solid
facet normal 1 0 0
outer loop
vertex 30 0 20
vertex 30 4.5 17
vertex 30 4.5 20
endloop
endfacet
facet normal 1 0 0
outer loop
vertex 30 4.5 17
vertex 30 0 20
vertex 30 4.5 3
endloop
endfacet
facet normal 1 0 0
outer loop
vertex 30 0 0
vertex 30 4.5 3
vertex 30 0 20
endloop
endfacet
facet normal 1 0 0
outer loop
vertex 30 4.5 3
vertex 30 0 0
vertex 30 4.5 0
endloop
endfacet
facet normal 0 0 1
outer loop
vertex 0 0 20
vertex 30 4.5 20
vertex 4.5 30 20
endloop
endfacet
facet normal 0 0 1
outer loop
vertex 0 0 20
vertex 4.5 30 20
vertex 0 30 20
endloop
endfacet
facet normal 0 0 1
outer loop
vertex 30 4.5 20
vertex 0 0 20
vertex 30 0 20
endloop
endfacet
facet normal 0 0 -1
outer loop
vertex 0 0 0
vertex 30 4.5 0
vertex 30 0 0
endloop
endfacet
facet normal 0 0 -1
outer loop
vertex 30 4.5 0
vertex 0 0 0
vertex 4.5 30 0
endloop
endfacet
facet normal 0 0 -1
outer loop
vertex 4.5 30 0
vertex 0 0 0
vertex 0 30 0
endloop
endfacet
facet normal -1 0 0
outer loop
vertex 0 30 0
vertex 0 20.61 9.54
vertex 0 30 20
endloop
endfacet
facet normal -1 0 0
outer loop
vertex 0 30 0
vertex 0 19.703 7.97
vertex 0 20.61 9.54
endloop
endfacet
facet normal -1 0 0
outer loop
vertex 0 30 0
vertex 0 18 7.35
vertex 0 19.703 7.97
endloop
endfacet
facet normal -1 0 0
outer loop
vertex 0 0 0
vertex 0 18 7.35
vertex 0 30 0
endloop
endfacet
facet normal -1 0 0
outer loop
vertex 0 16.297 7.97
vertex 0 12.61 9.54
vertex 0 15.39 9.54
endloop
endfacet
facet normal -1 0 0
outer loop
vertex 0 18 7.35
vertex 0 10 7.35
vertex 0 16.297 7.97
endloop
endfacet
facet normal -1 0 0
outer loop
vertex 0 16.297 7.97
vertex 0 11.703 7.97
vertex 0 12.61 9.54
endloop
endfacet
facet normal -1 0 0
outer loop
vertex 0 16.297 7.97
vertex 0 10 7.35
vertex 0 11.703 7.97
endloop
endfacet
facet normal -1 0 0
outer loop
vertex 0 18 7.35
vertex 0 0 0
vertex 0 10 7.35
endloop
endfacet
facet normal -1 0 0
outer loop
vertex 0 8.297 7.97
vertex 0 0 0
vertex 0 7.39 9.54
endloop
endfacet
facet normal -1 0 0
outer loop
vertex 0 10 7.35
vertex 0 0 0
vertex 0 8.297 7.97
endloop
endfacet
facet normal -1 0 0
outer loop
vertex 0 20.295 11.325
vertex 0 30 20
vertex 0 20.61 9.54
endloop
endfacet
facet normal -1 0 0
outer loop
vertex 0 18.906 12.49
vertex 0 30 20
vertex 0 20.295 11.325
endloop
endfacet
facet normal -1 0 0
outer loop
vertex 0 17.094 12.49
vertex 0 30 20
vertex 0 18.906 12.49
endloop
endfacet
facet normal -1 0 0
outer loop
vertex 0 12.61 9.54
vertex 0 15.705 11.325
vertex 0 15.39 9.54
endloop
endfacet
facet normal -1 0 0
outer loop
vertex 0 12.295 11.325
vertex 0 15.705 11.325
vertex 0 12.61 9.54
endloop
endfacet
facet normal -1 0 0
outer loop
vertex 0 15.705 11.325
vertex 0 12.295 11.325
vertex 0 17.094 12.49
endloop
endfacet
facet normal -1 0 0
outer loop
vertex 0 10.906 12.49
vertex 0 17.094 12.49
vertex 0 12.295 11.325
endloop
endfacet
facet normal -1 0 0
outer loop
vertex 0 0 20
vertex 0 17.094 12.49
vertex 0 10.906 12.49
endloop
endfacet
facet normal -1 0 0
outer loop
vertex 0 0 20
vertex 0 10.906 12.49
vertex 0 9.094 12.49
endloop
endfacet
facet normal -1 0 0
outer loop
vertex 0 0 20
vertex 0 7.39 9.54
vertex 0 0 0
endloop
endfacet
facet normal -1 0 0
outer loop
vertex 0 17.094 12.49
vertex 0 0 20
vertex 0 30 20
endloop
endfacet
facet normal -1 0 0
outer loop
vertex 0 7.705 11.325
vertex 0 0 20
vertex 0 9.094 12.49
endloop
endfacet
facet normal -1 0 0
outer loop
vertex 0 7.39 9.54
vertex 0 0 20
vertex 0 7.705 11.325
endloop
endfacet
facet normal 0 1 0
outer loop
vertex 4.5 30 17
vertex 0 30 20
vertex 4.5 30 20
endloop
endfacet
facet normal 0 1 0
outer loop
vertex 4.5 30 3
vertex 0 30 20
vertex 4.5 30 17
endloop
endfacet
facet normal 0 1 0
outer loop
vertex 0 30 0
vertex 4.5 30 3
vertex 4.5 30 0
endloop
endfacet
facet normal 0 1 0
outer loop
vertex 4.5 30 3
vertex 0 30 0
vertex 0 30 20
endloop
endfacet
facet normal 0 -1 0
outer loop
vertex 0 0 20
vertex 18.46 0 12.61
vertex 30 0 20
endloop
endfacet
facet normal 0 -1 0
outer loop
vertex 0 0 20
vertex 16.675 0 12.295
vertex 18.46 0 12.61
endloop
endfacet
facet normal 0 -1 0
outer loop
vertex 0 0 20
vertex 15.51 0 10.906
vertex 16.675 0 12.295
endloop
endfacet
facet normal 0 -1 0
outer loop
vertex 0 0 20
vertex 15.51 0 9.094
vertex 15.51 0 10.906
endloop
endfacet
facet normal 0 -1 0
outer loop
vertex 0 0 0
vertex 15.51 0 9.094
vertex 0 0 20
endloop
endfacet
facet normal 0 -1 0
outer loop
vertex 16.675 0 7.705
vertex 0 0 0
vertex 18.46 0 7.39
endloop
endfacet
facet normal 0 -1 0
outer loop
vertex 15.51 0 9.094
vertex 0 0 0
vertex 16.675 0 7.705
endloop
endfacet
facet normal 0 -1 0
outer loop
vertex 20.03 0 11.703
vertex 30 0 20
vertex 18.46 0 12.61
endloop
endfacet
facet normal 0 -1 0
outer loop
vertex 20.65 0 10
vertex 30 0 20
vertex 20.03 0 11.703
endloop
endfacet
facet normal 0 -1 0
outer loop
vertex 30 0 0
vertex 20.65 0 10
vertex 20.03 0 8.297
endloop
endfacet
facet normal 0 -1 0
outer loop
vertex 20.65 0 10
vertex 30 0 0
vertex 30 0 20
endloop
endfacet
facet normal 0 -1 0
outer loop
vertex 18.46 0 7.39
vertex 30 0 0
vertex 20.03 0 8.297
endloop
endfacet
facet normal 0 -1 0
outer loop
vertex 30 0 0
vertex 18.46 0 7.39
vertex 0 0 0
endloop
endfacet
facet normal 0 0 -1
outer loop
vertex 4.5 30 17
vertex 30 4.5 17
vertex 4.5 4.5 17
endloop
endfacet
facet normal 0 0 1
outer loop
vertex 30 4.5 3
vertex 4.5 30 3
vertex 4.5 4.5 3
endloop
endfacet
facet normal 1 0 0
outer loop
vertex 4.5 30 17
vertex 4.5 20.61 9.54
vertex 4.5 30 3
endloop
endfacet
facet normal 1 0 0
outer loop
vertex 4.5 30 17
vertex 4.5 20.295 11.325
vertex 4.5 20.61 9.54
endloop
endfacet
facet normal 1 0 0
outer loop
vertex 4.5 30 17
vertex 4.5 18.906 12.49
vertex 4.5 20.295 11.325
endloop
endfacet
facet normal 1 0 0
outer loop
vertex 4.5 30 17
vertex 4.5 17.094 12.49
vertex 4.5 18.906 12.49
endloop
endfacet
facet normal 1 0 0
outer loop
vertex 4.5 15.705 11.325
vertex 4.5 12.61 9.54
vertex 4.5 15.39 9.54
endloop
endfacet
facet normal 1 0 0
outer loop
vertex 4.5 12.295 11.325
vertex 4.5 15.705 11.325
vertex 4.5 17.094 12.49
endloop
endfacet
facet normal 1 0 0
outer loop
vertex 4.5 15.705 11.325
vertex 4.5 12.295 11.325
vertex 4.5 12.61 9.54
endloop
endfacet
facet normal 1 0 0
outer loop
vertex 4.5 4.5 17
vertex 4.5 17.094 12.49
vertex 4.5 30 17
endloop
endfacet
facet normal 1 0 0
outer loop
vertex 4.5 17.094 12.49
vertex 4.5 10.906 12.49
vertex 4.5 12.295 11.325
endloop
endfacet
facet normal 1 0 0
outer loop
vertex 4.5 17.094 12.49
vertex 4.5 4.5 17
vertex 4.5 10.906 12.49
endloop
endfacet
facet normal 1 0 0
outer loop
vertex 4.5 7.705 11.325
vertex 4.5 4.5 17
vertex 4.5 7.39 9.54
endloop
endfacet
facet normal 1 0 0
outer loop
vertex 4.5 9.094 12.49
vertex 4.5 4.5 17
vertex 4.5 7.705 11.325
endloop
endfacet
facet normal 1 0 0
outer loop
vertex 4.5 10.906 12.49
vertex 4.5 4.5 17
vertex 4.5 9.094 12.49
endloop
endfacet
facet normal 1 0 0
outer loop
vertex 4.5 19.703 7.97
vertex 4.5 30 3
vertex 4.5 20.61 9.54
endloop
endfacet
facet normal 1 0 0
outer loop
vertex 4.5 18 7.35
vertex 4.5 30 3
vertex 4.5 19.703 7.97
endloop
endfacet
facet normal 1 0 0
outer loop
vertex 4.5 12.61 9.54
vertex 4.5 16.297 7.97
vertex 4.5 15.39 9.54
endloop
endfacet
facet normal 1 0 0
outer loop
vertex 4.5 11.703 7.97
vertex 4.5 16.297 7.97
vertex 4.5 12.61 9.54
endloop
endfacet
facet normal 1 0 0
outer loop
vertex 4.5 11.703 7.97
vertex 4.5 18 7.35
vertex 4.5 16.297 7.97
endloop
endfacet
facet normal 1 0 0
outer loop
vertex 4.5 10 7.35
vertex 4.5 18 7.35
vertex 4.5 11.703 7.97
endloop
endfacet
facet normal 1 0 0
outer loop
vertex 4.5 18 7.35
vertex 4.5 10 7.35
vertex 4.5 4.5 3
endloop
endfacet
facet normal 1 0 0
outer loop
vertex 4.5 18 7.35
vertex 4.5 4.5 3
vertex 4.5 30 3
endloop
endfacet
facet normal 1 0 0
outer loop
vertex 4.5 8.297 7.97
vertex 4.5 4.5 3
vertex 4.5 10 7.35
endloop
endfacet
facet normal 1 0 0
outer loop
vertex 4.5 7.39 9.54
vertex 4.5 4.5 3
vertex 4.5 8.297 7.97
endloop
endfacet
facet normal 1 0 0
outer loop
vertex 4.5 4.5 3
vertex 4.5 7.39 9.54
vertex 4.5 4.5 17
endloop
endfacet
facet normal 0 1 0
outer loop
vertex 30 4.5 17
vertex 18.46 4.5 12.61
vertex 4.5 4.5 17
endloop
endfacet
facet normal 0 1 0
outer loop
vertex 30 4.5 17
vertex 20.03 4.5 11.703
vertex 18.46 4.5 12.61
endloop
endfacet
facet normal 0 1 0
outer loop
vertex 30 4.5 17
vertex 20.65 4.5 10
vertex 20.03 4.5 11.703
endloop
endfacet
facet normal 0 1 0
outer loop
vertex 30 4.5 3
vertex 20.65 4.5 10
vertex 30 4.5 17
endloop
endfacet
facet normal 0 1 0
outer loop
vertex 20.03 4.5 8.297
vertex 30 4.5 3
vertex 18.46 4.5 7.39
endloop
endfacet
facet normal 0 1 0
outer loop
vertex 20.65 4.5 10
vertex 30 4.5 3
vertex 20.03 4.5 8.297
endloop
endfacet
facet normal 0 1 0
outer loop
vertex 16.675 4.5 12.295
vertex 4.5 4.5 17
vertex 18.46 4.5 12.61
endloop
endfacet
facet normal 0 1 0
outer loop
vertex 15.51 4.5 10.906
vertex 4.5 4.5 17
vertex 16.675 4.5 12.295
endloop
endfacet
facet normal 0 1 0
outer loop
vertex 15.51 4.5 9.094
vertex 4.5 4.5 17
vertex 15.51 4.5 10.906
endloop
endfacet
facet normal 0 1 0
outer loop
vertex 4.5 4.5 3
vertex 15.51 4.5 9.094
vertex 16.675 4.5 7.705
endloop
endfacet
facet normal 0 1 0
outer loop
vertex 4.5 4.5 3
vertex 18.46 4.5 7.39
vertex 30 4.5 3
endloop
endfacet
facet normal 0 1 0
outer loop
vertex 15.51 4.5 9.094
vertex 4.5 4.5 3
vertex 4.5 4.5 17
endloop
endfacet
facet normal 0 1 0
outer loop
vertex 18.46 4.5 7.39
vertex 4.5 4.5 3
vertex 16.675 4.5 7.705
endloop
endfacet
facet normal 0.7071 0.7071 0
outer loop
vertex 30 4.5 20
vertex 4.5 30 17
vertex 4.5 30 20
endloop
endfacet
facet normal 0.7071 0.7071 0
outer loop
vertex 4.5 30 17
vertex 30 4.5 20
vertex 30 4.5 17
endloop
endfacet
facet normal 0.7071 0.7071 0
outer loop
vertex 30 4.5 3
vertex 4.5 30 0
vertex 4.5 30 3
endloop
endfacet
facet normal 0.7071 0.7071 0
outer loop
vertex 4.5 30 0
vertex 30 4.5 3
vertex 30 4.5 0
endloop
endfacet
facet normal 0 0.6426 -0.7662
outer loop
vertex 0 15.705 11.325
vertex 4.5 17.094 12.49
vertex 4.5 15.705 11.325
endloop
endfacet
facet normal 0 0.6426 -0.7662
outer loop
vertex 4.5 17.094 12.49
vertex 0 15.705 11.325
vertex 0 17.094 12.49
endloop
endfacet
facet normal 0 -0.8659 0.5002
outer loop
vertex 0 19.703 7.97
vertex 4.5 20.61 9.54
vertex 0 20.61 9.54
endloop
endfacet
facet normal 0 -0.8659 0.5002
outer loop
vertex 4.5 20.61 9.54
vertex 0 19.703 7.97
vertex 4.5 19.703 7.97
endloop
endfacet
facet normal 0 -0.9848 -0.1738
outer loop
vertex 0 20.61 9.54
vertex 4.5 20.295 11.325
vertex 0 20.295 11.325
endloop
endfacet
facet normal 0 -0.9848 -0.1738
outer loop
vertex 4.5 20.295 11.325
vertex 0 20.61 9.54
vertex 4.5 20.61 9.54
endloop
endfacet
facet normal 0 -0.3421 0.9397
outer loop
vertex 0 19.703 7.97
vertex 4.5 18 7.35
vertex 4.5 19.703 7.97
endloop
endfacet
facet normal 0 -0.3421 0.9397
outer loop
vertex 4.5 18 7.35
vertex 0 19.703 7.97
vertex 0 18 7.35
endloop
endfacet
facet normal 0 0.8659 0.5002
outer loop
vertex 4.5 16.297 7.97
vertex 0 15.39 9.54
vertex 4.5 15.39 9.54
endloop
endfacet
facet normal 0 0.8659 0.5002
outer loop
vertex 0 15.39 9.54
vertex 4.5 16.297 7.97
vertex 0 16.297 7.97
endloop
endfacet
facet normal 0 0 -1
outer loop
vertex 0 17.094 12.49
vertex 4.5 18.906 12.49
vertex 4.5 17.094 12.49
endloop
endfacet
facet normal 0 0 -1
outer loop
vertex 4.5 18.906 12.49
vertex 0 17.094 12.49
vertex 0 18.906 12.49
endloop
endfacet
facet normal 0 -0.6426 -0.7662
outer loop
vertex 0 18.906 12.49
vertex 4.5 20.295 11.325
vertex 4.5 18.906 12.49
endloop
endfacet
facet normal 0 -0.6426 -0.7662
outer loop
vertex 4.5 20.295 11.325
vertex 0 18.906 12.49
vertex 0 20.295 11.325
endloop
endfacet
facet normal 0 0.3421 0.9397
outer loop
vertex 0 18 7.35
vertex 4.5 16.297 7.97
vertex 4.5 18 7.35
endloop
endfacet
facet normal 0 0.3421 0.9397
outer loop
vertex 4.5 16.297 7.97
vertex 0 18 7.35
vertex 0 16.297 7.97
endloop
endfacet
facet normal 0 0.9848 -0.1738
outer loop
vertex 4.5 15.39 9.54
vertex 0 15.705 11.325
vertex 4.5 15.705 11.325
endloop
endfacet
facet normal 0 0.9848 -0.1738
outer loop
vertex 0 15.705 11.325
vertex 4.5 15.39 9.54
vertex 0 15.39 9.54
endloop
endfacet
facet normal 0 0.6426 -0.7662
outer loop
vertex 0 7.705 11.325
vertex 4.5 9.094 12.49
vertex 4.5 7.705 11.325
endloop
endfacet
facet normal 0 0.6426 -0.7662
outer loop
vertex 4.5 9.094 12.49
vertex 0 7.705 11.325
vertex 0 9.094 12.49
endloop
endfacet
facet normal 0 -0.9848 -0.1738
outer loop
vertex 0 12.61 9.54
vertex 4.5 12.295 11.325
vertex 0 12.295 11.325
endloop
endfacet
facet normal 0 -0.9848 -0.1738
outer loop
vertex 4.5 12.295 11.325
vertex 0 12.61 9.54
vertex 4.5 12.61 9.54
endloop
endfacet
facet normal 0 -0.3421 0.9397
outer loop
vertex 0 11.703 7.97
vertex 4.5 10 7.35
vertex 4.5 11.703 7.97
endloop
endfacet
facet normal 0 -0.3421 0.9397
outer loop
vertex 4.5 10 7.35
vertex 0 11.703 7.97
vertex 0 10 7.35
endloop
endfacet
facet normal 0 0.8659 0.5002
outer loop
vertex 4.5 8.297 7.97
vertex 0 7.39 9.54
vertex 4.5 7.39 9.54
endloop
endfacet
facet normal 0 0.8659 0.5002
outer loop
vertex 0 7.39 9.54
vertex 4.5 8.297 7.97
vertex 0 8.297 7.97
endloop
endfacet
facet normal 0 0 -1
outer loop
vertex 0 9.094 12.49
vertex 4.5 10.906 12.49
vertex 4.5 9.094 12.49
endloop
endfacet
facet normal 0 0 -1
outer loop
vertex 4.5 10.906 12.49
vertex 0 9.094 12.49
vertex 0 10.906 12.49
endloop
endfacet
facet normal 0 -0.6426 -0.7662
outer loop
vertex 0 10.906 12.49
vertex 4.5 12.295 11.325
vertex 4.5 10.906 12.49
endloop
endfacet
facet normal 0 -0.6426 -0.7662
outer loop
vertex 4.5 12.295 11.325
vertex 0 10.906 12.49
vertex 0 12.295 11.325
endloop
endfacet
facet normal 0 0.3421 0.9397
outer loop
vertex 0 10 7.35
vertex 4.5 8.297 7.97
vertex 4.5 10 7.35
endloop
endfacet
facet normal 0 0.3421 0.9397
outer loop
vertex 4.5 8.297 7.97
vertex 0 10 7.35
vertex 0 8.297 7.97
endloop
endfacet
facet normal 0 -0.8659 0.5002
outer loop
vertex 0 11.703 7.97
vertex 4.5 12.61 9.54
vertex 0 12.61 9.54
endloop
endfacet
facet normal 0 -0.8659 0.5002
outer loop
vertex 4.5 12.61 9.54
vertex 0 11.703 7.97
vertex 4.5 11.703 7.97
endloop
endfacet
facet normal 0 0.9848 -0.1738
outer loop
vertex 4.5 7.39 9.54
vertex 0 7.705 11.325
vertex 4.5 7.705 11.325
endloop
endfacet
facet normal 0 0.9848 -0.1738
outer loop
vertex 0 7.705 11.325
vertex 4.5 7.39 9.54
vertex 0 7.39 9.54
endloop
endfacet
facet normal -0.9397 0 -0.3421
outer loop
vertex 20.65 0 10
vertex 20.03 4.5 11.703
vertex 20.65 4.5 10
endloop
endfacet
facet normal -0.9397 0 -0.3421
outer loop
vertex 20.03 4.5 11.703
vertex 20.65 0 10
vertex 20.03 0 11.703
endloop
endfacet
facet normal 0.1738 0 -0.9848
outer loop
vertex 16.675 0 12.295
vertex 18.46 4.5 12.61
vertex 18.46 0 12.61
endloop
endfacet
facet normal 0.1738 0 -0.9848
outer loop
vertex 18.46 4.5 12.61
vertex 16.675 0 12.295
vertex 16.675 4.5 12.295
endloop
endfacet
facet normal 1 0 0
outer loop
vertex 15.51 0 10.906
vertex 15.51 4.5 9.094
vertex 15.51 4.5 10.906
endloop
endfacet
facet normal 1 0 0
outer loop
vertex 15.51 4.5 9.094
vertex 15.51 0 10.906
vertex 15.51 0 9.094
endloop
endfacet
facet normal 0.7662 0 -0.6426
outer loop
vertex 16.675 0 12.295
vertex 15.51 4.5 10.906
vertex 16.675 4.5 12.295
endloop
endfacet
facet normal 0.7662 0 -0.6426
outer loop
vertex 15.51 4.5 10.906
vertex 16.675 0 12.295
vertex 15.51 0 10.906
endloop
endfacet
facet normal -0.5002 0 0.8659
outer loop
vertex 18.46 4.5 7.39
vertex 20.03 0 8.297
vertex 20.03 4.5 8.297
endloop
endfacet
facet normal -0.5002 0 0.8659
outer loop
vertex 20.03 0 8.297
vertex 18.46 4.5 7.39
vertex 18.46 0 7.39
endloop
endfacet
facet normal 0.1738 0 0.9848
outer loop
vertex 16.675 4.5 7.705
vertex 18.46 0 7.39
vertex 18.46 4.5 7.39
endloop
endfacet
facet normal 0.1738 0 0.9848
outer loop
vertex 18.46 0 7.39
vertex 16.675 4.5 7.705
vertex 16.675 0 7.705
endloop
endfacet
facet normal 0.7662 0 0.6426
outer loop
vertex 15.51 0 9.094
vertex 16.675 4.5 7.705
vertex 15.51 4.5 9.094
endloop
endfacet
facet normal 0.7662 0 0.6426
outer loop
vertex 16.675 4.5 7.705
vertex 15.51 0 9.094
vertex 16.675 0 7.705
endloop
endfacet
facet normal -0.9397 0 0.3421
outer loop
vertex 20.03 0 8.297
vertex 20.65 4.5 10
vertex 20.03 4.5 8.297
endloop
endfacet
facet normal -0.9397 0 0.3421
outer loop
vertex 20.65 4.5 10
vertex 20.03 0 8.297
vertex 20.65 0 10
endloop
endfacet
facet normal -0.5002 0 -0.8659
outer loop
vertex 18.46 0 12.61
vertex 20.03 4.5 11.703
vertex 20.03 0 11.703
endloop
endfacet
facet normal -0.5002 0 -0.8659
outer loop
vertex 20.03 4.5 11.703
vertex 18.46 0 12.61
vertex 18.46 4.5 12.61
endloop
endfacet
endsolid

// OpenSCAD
//misumi reversal tabbed brackets HBLFSN5

//missing the bumps that fit into the extrusion.  1mm deep, no profile given.

side_l=30;
side_t=3;//measured
t=4.5;
w=20;
h1_d=18;
h2_d=10;
h_d=5.3;

module HBLFSN5(){
	color("SlateGray")
	difference(){
		cube([side_l, side_l, w]);
		translate([t,t,side_t])
		cube([side_l, side_l, w-side_t*2]);

		translate([side_l/2+t/2, side_l/2+t/2,0])
		rotate([0,0,45])
		translate([side_l, 0,0])
		cube([side_l*2, side_l*2, w*3], center=true);

		translate([0, h1_d, w/2])
		rotate([0,90,0])
		cylinder(r=h_d/2, h=1000, center=true);

		translate([0, h2_d, w/2])
		rotate([0,90,0])
		cylinder(r=h_d/2, h=1000, center=true);

		translate([h1_d, 0, w/2])
		rotate([90,0,0])
		cylinder(r=h_d/2, h=1000, center=true);
	}
}
HBLFSN5();
